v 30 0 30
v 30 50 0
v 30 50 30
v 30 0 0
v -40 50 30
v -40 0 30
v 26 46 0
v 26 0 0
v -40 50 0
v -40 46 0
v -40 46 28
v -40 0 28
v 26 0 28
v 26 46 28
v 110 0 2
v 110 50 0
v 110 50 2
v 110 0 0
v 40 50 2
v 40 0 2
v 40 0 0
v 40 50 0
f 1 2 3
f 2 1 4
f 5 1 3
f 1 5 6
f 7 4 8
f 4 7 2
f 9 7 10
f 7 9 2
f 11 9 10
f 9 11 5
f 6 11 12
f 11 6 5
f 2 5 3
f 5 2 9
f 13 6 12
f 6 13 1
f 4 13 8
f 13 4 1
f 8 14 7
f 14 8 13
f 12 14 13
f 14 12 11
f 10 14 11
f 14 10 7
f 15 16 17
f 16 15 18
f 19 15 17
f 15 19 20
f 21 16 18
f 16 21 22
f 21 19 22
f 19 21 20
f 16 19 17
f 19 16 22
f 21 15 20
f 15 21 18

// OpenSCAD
// Two-part enclosure for small electronics board
// Part 1: Box (left)
// Part 2: Lid (right, printed upside down)
// Prints together with a 10 mm gap between them.

// --- Dimensions ---
// Box Outer Dimensions (X x Y x Z)
$box_outer_x = 70;
$box_outer_y = 50;
$box_outer_z = 30;

// Wall and Floor Thickness
$wall_thickness = 2;
$floor_thickness = 2;

// Lid Dimensions
// Plate thickness
$plate_thickness = 2;
// Lip dimensions
$lip_thickness = 1.5;
$lip_height = 4;
// Lip outer size (fits inside box opening)
$lip_outer_x = 65.6;
$lip_outer_y = 45.6;

// Clearance
$clearance = 0.2;

// Gap between parts
$gap = 10;

// --- Configuration ---
$fn = 64; // Smooth curves

// --- Part 1: The Box ---
// Position: Centered in Y, starts at X = -($box_outer_x/2 + $gap/2)
// Rests on Z=0
translate([ -($box_outer_x/2 + $gap/2), 0, 0 ])
difference() {
    // Outer block
    cube([ $box_outer_x, $box_outer_y, $box_outer_z ]);
    
    // Cut out the inside (open top)
    // Inner dimensions:
    // X: outer_x - 2*wall
    // Y: outer_y - 2*wall
    // Z: outer_z - floor (cut all the way to the bottom of the box walls)
    inner_x = $box_outer_x - (2 * $wall_thickness);
    inner_y = $box_outer_y - (2 * $wall_thickness);
    inner_z = $box_outer_z - $floor_thickness;
    
    // Extend cut slightly past the bottom face to ensure no thin walls remain at the very bottom edge
    translate([0, 0, -0.1]) 
    cube([ inner_x, inner_y, inner_z + 0.1 ]);
}

// --- Part 2: The Lid ---
// Position: Centered in Y, starts at X = +($box_outer_x/2 + $gap/2)
// Rests on Z=0 (printed upside down as requested)
// The lid geometry is modeled with the plate at Z=0 and the lip extending upwards.
// This matches the description "plate ... lying on the bed, with a rectangular lip on top of it".
translate([ $box_outer_x/2 + $gap/2, 0, 0 ])
difference() {
    // Base Plate
    cube([ $box_outer_x, $box_outer_y, $plate_thickness ]);
    
    // Cut out the hole for the lip
    // The lip outer size is $lip_outer_x by $lip_outer_y.
    // We need to cut a hole slightly larger than the lip outer size to allow it to slide in.
    // Clearance on each side is 0.2mm.
    // Hole X = lip_outer_x + 2*clearance
    // Hole Y = lip_outer_y + 2*clearance
    // Depth = lip_height + lip_thickness (to remove the material the lip will sit on)
    
    hole_x = $lip_outer_x + (2 * $clearance);
    hole_y = $lip_outer_y + (2 * $clearance);
    hole_depth = $lip_height + $lip_thickness;
    
    // Extend cut slightly past the top face (which is the top of the printed part)
    translate([0, 0, $plate_thickness + 0.1])
    cube([ hole_x, hole_y, hole_depth - $plate_thickness - 0.1 ]);
}
